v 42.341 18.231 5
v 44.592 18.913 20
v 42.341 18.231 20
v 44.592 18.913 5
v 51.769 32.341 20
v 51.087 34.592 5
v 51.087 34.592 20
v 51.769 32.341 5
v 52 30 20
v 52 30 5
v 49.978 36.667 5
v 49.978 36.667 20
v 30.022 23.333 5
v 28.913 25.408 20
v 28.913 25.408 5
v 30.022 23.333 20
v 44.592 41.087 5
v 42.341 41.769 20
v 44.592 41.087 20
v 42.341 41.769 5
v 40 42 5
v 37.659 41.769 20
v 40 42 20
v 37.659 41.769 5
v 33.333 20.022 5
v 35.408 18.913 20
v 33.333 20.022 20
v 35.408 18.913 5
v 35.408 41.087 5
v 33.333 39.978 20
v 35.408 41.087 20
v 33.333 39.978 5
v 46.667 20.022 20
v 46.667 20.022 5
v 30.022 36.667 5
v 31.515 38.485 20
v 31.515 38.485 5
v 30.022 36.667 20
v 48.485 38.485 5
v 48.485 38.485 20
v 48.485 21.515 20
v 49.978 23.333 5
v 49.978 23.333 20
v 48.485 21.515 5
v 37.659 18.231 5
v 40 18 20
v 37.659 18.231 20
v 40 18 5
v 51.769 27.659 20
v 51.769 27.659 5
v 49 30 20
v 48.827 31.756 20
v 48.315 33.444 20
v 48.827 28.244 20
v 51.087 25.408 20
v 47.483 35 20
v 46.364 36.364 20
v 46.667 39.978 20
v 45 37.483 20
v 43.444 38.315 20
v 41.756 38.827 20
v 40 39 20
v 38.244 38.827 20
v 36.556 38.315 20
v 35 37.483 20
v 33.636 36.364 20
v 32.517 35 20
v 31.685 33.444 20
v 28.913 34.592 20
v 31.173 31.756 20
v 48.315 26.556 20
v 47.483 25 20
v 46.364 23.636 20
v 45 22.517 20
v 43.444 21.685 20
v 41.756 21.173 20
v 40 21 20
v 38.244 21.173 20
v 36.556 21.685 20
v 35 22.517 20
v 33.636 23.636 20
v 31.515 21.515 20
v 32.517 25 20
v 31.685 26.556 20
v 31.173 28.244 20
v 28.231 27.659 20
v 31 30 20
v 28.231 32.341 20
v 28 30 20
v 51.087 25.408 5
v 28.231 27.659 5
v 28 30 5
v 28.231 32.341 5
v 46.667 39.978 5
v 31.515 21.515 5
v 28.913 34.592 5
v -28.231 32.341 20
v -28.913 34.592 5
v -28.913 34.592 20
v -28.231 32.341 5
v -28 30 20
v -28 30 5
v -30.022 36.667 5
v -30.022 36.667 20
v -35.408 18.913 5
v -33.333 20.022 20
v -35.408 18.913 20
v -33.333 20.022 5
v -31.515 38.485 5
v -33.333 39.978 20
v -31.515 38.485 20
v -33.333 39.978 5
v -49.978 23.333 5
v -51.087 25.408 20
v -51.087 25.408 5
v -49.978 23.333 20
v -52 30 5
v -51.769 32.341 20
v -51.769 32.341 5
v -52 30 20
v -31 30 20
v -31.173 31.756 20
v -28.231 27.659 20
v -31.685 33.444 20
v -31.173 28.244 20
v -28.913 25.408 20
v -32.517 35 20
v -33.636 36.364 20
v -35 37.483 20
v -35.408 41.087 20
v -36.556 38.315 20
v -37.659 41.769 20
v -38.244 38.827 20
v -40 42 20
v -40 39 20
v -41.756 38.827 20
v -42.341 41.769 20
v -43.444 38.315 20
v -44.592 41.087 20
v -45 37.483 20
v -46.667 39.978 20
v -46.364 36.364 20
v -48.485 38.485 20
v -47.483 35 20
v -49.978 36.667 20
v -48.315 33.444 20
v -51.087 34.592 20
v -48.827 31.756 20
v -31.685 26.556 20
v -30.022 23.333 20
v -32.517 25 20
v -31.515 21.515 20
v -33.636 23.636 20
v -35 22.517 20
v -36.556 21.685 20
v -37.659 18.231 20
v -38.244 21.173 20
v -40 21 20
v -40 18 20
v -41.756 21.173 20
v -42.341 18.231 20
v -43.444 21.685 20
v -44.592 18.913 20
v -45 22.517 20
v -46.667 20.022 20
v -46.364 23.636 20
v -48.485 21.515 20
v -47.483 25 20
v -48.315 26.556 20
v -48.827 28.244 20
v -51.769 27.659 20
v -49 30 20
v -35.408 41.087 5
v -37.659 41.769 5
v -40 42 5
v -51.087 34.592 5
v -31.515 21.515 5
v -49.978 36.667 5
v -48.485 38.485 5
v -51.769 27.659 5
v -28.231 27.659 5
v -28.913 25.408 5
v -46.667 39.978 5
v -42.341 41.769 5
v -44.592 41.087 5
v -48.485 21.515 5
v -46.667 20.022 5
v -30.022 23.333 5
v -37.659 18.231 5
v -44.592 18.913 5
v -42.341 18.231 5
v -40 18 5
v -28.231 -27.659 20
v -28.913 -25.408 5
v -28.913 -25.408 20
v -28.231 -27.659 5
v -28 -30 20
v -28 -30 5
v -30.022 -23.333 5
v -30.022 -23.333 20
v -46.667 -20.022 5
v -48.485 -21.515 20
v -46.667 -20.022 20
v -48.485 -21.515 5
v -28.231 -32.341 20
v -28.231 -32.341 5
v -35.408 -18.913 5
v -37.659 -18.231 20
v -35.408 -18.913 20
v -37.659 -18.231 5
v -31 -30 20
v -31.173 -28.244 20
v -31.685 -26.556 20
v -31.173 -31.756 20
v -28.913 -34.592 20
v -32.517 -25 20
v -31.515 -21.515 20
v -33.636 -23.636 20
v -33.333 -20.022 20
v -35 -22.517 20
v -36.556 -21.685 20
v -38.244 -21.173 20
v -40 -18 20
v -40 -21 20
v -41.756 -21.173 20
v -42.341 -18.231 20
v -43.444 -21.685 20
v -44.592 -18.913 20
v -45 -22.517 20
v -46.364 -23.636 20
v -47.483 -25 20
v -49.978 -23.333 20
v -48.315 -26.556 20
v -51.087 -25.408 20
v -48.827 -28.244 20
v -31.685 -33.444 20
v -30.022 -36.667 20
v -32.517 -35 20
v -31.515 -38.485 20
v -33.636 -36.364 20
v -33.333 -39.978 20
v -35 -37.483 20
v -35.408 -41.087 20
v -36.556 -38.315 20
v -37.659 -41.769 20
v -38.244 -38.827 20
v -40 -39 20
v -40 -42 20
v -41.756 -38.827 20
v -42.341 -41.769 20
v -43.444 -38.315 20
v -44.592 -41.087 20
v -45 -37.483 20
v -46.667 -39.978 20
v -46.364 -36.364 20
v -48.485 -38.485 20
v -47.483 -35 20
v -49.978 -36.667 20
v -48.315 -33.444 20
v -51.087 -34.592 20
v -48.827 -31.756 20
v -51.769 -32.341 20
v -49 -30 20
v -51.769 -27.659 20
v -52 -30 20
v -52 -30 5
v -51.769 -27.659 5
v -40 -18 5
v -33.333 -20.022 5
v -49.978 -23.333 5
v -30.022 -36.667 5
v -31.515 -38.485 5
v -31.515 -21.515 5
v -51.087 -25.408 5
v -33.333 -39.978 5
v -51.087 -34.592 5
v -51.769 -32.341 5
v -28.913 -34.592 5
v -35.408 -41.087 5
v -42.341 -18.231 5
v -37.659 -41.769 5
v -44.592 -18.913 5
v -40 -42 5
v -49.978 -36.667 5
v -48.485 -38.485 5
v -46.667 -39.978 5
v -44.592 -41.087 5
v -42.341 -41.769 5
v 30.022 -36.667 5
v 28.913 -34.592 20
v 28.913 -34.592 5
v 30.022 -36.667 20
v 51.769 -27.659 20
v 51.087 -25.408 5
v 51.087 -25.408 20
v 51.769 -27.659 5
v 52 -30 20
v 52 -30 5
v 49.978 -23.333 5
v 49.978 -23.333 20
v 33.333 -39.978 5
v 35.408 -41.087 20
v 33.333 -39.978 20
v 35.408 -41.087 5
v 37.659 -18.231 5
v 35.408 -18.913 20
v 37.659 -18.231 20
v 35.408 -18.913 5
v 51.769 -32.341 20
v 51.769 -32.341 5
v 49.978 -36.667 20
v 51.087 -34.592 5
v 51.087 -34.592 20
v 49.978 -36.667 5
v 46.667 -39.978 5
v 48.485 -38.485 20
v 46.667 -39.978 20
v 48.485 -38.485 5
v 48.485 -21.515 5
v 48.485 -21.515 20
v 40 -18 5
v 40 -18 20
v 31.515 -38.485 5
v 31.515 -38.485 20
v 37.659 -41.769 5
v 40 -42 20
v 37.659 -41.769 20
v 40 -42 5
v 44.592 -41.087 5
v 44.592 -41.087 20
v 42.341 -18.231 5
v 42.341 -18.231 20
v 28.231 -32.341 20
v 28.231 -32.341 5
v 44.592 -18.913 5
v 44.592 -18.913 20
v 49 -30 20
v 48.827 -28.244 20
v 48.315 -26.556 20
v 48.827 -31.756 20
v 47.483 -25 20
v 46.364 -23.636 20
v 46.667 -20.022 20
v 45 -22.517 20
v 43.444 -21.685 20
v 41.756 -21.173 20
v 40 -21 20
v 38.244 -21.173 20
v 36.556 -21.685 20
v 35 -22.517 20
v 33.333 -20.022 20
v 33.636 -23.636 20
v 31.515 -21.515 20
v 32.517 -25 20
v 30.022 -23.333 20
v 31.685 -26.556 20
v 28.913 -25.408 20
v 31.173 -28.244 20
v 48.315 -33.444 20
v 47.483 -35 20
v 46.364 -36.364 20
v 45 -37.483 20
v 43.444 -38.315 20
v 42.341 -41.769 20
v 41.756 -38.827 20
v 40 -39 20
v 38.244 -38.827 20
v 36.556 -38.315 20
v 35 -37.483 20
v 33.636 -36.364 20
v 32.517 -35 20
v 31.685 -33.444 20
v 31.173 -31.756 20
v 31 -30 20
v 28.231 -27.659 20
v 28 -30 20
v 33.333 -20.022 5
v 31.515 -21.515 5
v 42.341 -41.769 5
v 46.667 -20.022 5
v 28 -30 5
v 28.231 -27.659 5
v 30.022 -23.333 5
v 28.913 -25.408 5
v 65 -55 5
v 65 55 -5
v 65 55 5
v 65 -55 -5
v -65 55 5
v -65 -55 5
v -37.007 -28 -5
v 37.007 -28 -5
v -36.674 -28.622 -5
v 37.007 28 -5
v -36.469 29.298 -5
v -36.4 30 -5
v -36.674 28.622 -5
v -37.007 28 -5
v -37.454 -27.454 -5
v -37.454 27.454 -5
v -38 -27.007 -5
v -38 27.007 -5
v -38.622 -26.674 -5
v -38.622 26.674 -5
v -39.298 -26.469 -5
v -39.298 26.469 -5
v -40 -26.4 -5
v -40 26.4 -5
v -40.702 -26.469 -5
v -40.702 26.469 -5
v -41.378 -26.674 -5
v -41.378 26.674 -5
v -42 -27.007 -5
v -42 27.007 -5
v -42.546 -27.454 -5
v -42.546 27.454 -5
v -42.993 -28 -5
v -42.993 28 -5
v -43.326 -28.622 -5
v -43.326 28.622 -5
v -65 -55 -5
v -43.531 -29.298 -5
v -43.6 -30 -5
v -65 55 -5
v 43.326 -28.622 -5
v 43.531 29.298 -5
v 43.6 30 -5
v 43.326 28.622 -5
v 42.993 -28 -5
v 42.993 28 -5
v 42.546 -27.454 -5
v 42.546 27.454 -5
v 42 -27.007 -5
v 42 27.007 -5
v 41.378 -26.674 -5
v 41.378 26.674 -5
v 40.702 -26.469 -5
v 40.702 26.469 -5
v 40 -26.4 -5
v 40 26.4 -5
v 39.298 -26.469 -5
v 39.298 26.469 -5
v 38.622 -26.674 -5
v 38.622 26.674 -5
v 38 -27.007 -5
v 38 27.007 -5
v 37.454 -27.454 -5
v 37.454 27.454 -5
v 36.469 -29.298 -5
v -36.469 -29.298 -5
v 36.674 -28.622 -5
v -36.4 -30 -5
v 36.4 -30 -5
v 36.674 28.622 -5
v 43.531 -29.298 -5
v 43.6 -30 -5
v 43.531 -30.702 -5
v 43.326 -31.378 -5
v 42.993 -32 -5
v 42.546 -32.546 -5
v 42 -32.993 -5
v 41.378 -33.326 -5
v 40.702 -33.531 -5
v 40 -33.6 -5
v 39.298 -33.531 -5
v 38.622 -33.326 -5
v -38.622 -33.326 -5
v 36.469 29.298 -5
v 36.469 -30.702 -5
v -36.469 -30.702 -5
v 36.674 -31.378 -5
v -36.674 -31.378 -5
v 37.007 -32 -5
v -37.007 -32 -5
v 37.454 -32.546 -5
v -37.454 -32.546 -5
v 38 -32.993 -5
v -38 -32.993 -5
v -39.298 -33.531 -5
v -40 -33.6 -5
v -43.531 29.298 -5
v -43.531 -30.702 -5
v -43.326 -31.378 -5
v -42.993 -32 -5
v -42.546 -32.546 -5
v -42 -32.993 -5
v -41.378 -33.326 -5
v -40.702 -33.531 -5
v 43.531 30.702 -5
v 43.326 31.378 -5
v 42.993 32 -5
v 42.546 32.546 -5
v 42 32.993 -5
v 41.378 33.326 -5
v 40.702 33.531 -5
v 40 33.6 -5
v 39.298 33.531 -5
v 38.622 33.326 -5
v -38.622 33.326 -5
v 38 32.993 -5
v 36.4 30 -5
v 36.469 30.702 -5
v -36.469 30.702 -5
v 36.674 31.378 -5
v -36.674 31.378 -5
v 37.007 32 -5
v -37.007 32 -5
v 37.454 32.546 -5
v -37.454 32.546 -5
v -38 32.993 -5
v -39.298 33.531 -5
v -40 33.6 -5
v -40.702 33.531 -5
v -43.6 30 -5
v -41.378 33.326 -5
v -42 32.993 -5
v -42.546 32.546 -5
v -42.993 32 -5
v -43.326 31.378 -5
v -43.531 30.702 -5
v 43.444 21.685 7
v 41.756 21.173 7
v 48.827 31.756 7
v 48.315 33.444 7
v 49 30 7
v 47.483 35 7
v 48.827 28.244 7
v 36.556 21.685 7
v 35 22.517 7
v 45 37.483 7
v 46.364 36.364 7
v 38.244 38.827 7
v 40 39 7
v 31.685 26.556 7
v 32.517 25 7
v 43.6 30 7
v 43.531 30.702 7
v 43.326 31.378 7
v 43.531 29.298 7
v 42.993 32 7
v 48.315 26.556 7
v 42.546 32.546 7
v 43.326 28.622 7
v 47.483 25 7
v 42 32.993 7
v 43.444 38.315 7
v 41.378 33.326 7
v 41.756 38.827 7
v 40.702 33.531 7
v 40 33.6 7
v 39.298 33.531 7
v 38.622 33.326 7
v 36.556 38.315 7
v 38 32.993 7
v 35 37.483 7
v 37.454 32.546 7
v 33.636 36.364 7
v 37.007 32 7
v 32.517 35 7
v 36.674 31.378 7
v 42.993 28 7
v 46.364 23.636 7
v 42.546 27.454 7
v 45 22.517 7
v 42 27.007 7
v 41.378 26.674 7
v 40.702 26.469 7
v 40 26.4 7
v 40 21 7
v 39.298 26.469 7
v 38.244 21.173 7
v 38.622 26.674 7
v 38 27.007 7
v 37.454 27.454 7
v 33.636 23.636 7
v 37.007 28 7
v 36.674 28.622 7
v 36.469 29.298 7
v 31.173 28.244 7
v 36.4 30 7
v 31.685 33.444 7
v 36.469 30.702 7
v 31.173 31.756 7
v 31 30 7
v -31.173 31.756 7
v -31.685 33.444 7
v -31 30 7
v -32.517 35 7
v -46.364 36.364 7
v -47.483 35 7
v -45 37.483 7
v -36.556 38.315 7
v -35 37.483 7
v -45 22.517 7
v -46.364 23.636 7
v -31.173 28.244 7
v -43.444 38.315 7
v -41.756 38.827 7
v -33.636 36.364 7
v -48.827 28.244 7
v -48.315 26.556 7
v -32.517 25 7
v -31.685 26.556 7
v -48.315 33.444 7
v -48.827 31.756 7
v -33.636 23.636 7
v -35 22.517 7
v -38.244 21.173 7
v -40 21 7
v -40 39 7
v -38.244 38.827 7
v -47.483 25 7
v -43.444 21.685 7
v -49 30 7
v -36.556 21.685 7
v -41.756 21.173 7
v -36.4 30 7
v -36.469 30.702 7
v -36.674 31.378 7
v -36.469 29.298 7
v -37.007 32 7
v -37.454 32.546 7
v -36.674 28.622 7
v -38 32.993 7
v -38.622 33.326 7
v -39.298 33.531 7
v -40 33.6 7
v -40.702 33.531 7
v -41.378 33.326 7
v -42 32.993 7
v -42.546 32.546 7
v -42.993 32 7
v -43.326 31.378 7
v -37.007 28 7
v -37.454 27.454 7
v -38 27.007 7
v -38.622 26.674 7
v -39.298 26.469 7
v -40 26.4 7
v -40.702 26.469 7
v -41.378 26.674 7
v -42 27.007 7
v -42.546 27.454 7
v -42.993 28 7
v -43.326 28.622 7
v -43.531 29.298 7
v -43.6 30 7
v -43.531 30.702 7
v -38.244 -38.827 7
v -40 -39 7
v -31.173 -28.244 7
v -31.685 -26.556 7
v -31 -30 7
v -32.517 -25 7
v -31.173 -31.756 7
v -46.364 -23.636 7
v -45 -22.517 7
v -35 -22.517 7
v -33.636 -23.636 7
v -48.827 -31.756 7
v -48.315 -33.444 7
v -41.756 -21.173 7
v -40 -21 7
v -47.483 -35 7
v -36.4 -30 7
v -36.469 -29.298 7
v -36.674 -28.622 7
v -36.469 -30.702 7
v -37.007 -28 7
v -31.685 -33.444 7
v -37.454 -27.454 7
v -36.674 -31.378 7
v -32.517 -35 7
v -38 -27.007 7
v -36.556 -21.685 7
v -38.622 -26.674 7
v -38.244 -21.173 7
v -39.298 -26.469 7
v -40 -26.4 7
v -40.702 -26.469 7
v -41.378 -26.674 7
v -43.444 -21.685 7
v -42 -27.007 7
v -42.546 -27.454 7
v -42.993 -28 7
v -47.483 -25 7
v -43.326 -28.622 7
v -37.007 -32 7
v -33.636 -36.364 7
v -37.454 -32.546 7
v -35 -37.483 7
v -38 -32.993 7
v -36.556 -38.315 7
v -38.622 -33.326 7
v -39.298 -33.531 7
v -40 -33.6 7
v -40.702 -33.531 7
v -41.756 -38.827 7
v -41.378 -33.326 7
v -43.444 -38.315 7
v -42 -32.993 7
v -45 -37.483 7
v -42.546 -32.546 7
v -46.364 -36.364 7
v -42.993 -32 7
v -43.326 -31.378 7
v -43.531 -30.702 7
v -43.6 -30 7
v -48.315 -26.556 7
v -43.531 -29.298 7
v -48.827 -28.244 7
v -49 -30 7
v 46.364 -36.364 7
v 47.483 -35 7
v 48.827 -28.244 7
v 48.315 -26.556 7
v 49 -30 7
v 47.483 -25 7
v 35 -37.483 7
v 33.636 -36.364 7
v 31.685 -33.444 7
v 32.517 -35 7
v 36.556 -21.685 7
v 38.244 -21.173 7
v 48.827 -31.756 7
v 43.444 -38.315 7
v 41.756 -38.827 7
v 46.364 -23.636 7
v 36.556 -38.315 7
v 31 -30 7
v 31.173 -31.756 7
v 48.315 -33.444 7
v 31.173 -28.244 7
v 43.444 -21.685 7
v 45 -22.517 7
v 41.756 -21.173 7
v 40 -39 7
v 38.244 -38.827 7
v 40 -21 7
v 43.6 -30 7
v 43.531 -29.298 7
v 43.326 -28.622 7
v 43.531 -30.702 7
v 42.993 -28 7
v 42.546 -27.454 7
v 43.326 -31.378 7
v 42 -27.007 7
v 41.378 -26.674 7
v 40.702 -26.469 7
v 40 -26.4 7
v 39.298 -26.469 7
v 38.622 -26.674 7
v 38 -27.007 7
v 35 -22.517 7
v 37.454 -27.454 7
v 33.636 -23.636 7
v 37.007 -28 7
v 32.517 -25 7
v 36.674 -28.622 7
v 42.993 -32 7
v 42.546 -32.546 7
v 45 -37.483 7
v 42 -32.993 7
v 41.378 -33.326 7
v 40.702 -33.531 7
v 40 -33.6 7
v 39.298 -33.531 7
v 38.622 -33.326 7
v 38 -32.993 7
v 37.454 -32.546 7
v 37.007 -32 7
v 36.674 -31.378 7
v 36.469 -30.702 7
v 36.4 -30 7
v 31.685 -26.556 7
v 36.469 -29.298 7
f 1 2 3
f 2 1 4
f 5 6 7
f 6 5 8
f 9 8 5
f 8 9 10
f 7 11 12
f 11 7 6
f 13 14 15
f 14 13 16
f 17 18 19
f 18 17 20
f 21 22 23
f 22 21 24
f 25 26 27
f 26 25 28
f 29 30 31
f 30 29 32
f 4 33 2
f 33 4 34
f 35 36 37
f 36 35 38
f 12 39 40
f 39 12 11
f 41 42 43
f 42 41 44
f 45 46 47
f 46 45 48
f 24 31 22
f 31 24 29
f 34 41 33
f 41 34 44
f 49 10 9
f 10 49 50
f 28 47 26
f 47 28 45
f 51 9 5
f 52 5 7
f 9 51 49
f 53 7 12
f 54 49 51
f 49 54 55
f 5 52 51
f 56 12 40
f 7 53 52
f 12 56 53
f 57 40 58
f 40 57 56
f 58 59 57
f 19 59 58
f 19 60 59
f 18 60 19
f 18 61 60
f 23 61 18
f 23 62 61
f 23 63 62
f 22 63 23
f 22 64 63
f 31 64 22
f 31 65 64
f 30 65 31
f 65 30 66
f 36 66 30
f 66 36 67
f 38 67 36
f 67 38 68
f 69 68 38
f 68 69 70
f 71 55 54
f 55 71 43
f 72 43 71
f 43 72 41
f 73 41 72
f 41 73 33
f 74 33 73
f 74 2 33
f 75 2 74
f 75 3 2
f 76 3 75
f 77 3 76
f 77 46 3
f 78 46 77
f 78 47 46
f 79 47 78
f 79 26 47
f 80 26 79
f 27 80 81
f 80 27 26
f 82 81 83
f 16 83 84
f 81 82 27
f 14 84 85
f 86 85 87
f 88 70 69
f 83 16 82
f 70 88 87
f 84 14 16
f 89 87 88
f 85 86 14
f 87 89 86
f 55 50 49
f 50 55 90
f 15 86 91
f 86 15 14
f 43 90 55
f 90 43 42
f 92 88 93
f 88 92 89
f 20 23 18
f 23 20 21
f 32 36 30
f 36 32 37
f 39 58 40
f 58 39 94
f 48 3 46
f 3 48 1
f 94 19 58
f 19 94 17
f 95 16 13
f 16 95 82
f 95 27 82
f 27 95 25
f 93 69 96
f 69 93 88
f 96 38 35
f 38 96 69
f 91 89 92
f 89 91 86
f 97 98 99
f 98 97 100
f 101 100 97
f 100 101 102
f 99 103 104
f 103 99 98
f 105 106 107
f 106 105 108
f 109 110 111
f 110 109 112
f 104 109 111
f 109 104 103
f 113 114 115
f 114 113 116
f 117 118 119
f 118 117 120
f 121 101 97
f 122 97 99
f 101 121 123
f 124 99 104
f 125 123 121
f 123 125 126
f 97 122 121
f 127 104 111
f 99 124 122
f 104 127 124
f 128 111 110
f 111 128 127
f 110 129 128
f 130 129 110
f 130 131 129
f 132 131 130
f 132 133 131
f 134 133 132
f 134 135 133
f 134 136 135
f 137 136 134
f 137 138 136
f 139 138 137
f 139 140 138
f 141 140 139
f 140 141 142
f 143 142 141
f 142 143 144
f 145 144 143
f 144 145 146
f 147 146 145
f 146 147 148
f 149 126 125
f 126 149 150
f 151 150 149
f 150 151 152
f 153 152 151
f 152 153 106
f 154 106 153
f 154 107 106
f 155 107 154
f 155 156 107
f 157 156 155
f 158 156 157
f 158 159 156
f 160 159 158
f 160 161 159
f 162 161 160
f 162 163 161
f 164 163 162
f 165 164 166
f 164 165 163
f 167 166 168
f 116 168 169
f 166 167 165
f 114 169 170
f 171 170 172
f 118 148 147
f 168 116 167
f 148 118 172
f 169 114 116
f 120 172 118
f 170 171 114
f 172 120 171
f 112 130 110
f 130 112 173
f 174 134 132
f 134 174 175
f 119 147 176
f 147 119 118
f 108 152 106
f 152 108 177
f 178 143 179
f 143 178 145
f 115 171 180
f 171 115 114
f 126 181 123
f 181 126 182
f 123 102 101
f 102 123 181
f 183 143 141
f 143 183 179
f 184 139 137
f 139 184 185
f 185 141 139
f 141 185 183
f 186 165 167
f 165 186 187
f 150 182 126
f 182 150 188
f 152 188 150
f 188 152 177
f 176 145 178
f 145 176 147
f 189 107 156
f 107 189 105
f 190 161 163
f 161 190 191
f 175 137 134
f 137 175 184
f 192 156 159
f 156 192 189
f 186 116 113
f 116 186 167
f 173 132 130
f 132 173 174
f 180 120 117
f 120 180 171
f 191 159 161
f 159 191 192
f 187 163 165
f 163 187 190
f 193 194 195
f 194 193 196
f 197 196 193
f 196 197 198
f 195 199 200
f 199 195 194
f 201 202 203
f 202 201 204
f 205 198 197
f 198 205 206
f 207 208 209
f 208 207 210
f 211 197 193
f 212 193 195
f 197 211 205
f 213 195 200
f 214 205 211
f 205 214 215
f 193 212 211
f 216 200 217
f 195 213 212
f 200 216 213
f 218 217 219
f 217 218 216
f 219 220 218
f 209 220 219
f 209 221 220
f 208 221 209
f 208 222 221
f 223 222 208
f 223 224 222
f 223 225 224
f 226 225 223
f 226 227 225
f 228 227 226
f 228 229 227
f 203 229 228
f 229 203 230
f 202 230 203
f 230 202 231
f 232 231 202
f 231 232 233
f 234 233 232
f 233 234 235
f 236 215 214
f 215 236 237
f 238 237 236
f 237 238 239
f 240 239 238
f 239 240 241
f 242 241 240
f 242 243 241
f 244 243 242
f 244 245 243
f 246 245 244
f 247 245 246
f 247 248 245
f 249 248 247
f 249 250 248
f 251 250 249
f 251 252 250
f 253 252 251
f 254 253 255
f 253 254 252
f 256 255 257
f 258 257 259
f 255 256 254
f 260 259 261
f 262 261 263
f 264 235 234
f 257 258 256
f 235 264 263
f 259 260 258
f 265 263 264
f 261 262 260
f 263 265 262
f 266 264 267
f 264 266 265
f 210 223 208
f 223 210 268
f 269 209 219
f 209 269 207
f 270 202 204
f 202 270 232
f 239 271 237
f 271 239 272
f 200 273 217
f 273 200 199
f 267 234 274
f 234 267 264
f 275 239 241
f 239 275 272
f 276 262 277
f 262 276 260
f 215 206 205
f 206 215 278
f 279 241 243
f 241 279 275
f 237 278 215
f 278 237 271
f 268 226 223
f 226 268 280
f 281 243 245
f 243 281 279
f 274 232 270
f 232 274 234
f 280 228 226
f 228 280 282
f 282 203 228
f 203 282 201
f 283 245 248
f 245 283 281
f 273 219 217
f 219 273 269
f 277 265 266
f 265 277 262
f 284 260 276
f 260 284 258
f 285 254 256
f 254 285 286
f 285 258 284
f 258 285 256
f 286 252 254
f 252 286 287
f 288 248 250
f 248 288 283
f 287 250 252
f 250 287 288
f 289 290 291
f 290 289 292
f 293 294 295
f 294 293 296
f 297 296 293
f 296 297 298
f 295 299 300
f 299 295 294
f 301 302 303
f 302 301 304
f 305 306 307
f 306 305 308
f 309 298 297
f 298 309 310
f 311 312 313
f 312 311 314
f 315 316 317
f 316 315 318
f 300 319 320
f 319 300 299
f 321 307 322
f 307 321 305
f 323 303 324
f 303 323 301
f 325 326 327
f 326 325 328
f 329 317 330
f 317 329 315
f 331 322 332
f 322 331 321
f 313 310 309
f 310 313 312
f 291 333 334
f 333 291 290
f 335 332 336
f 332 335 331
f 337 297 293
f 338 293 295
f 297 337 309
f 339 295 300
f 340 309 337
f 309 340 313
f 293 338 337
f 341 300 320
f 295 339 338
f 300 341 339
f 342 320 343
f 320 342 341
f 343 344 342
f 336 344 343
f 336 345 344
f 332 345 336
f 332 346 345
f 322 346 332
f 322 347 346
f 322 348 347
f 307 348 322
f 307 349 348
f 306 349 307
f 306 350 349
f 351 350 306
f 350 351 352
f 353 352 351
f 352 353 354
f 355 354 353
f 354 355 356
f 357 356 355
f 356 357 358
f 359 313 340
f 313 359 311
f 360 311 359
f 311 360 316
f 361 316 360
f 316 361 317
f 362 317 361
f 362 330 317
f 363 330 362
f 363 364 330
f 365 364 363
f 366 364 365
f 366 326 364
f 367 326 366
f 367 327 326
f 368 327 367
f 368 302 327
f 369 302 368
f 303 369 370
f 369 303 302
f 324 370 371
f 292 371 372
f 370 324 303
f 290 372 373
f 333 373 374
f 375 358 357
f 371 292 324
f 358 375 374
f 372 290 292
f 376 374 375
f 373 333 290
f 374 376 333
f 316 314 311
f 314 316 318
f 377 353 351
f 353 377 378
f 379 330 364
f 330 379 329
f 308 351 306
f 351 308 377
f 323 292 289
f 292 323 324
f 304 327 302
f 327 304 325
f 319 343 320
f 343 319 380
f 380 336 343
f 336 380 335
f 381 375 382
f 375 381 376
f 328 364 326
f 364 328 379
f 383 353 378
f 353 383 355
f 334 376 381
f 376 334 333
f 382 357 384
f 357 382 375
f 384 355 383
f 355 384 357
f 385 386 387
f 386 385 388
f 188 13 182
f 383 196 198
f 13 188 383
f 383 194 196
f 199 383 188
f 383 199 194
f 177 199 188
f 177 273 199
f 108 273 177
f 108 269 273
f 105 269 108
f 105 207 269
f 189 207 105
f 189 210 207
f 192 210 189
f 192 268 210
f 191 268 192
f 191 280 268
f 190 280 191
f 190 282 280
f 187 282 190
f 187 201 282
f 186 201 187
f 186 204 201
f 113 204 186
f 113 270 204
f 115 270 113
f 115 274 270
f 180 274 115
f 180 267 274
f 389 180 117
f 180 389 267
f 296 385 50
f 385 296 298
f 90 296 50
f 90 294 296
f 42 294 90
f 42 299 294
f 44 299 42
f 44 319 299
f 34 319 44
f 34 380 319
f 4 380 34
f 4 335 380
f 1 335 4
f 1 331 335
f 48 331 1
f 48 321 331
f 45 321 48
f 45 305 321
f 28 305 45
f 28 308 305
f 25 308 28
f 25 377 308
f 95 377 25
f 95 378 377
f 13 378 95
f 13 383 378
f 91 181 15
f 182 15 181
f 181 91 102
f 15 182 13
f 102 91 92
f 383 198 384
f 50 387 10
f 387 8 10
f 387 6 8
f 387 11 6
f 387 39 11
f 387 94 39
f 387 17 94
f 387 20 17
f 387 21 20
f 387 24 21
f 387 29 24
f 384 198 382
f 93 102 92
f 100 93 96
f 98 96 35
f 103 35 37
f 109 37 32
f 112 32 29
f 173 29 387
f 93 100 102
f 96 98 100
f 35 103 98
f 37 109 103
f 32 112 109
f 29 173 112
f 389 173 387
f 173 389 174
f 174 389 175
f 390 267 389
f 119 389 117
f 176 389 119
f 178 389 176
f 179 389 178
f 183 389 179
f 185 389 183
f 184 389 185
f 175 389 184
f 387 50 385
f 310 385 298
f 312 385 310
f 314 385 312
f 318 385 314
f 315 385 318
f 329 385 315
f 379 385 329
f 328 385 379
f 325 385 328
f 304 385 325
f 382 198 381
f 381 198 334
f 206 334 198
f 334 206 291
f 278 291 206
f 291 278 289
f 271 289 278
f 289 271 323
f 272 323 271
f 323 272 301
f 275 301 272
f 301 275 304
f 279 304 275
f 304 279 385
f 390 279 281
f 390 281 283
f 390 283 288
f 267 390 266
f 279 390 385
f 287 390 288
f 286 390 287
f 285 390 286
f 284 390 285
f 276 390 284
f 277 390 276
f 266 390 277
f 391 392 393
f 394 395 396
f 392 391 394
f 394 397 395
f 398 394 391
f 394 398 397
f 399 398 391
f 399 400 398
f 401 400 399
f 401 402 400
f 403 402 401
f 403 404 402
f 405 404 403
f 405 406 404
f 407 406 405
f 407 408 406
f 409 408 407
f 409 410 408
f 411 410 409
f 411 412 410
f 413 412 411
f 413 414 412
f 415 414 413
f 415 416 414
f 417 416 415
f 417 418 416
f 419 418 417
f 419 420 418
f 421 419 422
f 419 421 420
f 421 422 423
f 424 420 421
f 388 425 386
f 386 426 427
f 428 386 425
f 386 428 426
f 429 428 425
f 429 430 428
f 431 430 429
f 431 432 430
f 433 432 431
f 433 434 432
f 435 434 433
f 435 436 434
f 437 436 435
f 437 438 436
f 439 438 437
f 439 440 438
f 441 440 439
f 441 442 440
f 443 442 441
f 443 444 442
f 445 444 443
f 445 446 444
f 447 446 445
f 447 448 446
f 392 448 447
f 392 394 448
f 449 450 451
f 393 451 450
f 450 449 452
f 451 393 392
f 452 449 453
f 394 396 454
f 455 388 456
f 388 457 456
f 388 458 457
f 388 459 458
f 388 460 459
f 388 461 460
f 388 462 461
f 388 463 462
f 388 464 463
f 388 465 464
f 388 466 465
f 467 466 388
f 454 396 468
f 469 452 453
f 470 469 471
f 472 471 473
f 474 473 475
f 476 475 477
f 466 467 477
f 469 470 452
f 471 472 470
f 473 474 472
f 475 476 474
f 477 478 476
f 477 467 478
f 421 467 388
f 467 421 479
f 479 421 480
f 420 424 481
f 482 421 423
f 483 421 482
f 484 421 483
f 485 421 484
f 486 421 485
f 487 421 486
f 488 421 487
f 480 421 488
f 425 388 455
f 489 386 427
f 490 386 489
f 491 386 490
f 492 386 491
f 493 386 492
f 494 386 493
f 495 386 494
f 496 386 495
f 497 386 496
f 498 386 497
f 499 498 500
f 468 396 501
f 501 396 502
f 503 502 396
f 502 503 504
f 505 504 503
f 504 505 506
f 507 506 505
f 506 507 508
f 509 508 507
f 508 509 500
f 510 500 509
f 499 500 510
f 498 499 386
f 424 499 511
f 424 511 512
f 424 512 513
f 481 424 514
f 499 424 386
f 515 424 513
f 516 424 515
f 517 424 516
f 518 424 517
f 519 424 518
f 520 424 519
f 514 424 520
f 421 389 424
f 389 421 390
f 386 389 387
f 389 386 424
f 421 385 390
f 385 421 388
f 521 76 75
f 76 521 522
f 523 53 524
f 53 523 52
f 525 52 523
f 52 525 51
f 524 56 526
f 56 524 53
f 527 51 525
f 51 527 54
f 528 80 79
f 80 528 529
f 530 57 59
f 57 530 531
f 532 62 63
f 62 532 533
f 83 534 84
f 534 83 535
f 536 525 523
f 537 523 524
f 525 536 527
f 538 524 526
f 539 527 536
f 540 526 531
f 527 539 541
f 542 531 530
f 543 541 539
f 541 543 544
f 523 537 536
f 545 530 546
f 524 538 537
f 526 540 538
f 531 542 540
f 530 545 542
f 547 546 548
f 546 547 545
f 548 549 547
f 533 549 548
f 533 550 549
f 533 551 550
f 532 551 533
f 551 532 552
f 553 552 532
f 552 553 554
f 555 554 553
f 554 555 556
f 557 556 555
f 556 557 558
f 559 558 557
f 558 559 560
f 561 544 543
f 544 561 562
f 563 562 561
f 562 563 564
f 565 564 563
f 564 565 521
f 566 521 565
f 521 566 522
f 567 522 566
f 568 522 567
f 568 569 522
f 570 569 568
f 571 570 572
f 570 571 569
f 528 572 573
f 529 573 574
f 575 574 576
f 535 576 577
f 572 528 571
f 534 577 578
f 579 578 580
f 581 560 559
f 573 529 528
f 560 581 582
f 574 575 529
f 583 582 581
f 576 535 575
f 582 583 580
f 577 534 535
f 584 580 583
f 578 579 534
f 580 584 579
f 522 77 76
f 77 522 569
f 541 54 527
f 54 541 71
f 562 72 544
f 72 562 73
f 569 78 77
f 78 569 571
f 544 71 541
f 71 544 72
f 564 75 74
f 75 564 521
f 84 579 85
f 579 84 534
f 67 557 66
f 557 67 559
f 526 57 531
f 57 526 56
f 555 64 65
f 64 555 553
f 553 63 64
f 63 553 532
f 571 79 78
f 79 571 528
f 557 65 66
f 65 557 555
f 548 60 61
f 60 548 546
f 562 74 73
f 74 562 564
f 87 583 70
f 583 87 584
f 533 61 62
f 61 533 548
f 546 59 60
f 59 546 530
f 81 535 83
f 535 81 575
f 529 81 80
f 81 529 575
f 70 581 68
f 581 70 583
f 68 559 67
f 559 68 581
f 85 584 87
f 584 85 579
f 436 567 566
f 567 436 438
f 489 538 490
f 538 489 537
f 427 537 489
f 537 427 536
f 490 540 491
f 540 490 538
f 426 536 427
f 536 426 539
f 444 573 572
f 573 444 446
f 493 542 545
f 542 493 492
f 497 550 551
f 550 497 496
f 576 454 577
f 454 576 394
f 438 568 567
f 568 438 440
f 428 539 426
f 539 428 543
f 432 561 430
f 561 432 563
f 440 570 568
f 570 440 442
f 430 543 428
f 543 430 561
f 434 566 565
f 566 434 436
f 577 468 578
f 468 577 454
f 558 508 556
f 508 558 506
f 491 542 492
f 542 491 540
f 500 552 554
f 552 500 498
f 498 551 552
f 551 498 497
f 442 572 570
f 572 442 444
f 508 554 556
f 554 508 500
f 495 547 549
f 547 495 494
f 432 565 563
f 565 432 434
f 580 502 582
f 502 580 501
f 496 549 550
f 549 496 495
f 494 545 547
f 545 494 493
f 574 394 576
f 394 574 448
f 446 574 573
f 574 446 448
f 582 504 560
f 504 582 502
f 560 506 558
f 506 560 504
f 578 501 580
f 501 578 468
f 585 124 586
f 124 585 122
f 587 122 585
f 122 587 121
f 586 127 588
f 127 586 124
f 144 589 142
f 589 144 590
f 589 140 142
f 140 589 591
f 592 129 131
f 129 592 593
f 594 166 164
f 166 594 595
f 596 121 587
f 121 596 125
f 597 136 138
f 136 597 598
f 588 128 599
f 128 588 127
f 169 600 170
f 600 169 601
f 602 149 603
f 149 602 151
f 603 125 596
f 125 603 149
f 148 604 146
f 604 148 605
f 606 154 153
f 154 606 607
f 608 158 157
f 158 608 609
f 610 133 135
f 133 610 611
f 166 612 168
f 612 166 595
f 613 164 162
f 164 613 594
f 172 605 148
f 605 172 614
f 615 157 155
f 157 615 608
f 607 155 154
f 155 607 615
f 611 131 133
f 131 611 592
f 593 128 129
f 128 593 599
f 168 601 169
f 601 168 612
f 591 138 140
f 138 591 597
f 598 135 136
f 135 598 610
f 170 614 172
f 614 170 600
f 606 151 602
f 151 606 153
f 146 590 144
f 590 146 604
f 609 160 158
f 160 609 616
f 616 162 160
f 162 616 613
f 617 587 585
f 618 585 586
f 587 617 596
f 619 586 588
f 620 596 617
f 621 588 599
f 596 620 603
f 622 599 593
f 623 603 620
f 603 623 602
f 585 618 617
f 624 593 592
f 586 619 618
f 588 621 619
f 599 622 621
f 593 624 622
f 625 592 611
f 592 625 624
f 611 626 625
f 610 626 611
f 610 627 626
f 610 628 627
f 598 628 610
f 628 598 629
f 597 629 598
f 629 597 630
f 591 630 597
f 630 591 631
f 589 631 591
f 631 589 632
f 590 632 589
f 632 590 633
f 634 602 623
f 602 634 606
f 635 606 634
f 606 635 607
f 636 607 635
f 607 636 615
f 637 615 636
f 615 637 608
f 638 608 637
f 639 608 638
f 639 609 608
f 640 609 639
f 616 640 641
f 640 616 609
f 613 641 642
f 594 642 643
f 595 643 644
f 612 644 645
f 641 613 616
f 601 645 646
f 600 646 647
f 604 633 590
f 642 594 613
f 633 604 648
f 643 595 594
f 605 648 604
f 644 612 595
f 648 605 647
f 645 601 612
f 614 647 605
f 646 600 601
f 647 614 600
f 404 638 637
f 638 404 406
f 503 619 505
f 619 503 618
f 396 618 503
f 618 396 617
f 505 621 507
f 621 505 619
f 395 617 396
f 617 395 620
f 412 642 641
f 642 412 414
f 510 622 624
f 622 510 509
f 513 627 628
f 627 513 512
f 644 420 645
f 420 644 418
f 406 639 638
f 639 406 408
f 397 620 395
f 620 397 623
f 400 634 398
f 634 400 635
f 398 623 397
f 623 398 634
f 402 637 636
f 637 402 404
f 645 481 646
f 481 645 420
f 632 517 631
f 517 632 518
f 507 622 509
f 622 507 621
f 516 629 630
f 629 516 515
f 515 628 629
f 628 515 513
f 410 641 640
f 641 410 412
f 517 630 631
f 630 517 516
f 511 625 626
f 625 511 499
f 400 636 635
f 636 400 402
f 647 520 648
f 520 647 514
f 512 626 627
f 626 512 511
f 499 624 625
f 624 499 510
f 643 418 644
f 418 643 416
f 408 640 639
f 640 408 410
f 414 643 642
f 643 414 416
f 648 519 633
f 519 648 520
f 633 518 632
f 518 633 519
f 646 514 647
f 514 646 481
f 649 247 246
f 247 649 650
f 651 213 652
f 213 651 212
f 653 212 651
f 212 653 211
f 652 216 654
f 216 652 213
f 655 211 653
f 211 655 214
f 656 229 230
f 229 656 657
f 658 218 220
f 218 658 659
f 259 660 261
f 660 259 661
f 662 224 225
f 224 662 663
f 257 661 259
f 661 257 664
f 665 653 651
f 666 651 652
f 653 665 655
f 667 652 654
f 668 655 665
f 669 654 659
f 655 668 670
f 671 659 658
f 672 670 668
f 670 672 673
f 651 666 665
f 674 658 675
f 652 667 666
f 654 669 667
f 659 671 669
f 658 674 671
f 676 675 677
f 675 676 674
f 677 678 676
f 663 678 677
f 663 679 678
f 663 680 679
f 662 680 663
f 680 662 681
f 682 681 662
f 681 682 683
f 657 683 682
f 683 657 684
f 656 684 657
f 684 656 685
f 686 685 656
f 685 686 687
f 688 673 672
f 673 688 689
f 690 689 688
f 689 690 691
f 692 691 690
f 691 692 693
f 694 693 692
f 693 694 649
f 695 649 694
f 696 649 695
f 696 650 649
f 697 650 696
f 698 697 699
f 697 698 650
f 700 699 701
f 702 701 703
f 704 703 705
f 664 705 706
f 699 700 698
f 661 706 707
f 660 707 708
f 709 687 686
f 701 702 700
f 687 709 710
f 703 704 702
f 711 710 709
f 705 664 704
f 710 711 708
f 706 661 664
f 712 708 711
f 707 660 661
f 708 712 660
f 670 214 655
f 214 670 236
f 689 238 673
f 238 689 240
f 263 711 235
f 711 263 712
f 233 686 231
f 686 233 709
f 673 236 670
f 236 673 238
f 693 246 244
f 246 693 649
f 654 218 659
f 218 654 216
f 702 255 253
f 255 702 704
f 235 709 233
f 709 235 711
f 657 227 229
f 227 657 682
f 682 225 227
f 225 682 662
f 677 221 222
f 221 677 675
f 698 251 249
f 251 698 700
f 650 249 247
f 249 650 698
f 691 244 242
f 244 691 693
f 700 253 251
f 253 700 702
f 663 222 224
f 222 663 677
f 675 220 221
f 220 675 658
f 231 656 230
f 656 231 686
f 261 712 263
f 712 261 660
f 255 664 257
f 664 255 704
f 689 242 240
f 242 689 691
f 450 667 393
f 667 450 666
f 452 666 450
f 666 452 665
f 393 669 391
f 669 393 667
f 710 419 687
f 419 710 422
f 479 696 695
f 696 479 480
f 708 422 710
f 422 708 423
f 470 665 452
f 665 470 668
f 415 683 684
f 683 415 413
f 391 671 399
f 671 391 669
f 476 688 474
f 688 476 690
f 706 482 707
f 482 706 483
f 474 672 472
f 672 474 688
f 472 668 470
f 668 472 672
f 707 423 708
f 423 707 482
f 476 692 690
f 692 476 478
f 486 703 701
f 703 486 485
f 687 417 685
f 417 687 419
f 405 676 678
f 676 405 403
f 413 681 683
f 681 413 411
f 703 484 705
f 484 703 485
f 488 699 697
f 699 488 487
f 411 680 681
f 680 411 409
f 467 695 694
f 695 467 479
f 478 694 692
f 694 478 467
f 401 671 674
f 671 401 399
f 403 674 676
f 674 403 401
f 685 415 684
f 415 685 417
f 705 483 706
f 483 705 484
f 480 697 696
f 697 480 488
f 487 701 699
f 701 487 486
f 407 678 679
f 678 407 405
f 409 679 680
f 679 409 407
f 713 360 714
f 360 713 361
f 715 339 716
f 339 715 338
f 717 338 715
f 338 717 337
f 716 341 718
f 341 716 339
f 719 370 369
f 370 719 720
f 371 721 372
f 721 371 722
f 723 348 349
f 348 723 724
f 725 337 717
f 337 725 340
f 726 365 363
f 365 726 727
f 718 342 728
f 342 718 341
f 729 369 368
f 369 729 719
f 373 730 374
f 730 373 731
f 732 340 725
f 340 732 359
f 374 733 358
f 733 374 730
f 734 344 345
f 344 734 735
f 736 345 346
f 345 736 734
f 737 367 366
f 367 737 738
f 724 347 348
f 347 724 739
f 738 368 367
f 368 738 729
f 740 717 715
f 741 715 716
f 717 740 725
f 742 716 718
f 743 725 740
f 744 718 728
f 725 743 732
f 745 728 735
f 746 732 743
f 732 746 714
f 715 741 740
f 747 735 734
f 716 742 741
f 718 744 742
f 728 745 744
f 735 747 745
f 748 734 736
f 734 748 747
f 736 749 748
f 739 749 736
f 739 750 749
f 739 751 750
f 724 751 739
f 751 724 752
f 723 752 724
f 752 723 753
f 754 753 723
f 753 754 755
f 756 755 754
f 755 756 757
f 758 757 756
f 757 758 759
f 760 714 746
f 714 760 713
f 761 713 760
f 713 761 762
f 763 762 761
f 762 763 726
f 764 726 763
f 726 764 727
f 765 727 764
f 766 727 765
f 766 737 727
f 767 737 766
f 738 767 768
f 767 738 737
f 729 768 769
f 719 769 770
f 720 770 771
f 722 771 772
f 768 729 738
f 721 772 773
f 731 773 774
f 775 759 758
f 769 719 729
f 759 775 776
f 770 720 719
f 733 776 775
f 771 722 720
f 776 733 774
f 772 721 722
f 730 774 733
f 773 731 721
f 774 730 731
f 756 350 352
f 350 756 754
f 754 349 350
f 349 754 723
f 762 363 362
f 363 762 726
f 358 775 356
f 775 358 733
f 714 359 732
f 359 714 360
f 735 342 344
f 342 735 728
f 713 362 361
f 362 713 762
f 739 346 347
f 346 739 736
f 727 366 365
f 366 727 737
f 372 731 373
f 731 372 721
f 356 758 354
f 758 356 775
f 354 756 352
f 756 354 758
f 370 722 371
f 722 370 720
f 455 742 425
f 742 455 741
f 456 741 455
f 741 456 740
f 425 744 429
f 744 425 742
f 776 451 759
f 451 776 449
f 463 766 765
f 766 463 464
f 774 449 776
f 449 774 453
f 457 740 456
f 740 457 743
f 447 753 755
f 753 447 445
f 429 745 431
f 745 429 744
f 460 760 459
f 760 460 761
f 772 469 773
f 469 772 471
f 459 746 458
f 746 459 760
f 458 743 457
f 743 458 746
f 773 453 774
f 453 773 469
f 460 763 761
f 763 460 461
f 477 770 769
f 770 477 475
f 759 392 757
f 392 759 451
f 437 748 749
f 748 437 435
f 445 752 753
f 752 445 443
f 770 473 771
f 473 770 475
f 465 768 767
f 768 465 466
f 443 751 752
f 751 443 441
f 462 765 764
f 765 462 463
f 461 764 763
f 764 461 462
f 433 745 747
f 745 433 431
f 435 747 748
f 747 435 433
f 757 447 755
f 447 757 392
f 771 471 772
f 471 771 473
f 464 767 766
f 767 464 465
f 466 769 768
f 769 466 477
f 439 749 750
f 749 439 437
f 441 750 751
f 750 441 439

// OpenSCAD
$fn = 32;

// ----------------------------------------------------------------------
// Socket pad plate
// bosses with counterbored sockets for the screws
// ----------------------------------------------------------------------

// --- parameters (mm) ---
base_t = 10;             // base plate thickness
boss_h = 15;             // boss height above the base plate
boss_d = 24;             // boss diameter
socket_d = 18;           // socket diameter
socket_depth = 13;       // socket depth from the boss face
bolt_d = 7.2;            // screw clearance hole through the socket floor
plate = [130, 110, 10];  // overall size (x, y, z)
edge = 25;               // boss centre offset from the plate edge
pads = 4;                // boss count, one per corner

// --- derived feature positions (mm) ---
height = base_t + boss_h;        // = 25   overall height of the part
corner_x = plate[0] / 2 - edge;  // = 40   boss centre X
corner_y = plate[1] / 2 - edge;  // = 30   boss centre Y
feature_centers = [
  [corner_x, corner_y],
  [-corner_x, corner_y],
  [-corner_x, -corner_y],
  [corner_x, -corner_y]
];   // boss centres: sockets, holes and the pads themselves are placed from here

// base plate, bosses on feature_centers, socket + through hole in each
difference() {
  union() {
    cube(plate, center = true);
    for (centre = feature_centers)
      translate([centre[0], centre[1], plate[2] / 2 - 1])
        cylinder(d = boss_d, h = boss_h + 1);
  }
  for (centre = feature_centers) {
    translate([centre[0], centre[1], plate[2] / 2 + boss_h - socket_depth])
      cylinder(d = socket_d, h = socket_depth + 1);
    translate([centre[0], centre[1], -height])
      cylinder(d = bolt_d, h = 2 * height + 2);  // through the socket floor
  }
}
